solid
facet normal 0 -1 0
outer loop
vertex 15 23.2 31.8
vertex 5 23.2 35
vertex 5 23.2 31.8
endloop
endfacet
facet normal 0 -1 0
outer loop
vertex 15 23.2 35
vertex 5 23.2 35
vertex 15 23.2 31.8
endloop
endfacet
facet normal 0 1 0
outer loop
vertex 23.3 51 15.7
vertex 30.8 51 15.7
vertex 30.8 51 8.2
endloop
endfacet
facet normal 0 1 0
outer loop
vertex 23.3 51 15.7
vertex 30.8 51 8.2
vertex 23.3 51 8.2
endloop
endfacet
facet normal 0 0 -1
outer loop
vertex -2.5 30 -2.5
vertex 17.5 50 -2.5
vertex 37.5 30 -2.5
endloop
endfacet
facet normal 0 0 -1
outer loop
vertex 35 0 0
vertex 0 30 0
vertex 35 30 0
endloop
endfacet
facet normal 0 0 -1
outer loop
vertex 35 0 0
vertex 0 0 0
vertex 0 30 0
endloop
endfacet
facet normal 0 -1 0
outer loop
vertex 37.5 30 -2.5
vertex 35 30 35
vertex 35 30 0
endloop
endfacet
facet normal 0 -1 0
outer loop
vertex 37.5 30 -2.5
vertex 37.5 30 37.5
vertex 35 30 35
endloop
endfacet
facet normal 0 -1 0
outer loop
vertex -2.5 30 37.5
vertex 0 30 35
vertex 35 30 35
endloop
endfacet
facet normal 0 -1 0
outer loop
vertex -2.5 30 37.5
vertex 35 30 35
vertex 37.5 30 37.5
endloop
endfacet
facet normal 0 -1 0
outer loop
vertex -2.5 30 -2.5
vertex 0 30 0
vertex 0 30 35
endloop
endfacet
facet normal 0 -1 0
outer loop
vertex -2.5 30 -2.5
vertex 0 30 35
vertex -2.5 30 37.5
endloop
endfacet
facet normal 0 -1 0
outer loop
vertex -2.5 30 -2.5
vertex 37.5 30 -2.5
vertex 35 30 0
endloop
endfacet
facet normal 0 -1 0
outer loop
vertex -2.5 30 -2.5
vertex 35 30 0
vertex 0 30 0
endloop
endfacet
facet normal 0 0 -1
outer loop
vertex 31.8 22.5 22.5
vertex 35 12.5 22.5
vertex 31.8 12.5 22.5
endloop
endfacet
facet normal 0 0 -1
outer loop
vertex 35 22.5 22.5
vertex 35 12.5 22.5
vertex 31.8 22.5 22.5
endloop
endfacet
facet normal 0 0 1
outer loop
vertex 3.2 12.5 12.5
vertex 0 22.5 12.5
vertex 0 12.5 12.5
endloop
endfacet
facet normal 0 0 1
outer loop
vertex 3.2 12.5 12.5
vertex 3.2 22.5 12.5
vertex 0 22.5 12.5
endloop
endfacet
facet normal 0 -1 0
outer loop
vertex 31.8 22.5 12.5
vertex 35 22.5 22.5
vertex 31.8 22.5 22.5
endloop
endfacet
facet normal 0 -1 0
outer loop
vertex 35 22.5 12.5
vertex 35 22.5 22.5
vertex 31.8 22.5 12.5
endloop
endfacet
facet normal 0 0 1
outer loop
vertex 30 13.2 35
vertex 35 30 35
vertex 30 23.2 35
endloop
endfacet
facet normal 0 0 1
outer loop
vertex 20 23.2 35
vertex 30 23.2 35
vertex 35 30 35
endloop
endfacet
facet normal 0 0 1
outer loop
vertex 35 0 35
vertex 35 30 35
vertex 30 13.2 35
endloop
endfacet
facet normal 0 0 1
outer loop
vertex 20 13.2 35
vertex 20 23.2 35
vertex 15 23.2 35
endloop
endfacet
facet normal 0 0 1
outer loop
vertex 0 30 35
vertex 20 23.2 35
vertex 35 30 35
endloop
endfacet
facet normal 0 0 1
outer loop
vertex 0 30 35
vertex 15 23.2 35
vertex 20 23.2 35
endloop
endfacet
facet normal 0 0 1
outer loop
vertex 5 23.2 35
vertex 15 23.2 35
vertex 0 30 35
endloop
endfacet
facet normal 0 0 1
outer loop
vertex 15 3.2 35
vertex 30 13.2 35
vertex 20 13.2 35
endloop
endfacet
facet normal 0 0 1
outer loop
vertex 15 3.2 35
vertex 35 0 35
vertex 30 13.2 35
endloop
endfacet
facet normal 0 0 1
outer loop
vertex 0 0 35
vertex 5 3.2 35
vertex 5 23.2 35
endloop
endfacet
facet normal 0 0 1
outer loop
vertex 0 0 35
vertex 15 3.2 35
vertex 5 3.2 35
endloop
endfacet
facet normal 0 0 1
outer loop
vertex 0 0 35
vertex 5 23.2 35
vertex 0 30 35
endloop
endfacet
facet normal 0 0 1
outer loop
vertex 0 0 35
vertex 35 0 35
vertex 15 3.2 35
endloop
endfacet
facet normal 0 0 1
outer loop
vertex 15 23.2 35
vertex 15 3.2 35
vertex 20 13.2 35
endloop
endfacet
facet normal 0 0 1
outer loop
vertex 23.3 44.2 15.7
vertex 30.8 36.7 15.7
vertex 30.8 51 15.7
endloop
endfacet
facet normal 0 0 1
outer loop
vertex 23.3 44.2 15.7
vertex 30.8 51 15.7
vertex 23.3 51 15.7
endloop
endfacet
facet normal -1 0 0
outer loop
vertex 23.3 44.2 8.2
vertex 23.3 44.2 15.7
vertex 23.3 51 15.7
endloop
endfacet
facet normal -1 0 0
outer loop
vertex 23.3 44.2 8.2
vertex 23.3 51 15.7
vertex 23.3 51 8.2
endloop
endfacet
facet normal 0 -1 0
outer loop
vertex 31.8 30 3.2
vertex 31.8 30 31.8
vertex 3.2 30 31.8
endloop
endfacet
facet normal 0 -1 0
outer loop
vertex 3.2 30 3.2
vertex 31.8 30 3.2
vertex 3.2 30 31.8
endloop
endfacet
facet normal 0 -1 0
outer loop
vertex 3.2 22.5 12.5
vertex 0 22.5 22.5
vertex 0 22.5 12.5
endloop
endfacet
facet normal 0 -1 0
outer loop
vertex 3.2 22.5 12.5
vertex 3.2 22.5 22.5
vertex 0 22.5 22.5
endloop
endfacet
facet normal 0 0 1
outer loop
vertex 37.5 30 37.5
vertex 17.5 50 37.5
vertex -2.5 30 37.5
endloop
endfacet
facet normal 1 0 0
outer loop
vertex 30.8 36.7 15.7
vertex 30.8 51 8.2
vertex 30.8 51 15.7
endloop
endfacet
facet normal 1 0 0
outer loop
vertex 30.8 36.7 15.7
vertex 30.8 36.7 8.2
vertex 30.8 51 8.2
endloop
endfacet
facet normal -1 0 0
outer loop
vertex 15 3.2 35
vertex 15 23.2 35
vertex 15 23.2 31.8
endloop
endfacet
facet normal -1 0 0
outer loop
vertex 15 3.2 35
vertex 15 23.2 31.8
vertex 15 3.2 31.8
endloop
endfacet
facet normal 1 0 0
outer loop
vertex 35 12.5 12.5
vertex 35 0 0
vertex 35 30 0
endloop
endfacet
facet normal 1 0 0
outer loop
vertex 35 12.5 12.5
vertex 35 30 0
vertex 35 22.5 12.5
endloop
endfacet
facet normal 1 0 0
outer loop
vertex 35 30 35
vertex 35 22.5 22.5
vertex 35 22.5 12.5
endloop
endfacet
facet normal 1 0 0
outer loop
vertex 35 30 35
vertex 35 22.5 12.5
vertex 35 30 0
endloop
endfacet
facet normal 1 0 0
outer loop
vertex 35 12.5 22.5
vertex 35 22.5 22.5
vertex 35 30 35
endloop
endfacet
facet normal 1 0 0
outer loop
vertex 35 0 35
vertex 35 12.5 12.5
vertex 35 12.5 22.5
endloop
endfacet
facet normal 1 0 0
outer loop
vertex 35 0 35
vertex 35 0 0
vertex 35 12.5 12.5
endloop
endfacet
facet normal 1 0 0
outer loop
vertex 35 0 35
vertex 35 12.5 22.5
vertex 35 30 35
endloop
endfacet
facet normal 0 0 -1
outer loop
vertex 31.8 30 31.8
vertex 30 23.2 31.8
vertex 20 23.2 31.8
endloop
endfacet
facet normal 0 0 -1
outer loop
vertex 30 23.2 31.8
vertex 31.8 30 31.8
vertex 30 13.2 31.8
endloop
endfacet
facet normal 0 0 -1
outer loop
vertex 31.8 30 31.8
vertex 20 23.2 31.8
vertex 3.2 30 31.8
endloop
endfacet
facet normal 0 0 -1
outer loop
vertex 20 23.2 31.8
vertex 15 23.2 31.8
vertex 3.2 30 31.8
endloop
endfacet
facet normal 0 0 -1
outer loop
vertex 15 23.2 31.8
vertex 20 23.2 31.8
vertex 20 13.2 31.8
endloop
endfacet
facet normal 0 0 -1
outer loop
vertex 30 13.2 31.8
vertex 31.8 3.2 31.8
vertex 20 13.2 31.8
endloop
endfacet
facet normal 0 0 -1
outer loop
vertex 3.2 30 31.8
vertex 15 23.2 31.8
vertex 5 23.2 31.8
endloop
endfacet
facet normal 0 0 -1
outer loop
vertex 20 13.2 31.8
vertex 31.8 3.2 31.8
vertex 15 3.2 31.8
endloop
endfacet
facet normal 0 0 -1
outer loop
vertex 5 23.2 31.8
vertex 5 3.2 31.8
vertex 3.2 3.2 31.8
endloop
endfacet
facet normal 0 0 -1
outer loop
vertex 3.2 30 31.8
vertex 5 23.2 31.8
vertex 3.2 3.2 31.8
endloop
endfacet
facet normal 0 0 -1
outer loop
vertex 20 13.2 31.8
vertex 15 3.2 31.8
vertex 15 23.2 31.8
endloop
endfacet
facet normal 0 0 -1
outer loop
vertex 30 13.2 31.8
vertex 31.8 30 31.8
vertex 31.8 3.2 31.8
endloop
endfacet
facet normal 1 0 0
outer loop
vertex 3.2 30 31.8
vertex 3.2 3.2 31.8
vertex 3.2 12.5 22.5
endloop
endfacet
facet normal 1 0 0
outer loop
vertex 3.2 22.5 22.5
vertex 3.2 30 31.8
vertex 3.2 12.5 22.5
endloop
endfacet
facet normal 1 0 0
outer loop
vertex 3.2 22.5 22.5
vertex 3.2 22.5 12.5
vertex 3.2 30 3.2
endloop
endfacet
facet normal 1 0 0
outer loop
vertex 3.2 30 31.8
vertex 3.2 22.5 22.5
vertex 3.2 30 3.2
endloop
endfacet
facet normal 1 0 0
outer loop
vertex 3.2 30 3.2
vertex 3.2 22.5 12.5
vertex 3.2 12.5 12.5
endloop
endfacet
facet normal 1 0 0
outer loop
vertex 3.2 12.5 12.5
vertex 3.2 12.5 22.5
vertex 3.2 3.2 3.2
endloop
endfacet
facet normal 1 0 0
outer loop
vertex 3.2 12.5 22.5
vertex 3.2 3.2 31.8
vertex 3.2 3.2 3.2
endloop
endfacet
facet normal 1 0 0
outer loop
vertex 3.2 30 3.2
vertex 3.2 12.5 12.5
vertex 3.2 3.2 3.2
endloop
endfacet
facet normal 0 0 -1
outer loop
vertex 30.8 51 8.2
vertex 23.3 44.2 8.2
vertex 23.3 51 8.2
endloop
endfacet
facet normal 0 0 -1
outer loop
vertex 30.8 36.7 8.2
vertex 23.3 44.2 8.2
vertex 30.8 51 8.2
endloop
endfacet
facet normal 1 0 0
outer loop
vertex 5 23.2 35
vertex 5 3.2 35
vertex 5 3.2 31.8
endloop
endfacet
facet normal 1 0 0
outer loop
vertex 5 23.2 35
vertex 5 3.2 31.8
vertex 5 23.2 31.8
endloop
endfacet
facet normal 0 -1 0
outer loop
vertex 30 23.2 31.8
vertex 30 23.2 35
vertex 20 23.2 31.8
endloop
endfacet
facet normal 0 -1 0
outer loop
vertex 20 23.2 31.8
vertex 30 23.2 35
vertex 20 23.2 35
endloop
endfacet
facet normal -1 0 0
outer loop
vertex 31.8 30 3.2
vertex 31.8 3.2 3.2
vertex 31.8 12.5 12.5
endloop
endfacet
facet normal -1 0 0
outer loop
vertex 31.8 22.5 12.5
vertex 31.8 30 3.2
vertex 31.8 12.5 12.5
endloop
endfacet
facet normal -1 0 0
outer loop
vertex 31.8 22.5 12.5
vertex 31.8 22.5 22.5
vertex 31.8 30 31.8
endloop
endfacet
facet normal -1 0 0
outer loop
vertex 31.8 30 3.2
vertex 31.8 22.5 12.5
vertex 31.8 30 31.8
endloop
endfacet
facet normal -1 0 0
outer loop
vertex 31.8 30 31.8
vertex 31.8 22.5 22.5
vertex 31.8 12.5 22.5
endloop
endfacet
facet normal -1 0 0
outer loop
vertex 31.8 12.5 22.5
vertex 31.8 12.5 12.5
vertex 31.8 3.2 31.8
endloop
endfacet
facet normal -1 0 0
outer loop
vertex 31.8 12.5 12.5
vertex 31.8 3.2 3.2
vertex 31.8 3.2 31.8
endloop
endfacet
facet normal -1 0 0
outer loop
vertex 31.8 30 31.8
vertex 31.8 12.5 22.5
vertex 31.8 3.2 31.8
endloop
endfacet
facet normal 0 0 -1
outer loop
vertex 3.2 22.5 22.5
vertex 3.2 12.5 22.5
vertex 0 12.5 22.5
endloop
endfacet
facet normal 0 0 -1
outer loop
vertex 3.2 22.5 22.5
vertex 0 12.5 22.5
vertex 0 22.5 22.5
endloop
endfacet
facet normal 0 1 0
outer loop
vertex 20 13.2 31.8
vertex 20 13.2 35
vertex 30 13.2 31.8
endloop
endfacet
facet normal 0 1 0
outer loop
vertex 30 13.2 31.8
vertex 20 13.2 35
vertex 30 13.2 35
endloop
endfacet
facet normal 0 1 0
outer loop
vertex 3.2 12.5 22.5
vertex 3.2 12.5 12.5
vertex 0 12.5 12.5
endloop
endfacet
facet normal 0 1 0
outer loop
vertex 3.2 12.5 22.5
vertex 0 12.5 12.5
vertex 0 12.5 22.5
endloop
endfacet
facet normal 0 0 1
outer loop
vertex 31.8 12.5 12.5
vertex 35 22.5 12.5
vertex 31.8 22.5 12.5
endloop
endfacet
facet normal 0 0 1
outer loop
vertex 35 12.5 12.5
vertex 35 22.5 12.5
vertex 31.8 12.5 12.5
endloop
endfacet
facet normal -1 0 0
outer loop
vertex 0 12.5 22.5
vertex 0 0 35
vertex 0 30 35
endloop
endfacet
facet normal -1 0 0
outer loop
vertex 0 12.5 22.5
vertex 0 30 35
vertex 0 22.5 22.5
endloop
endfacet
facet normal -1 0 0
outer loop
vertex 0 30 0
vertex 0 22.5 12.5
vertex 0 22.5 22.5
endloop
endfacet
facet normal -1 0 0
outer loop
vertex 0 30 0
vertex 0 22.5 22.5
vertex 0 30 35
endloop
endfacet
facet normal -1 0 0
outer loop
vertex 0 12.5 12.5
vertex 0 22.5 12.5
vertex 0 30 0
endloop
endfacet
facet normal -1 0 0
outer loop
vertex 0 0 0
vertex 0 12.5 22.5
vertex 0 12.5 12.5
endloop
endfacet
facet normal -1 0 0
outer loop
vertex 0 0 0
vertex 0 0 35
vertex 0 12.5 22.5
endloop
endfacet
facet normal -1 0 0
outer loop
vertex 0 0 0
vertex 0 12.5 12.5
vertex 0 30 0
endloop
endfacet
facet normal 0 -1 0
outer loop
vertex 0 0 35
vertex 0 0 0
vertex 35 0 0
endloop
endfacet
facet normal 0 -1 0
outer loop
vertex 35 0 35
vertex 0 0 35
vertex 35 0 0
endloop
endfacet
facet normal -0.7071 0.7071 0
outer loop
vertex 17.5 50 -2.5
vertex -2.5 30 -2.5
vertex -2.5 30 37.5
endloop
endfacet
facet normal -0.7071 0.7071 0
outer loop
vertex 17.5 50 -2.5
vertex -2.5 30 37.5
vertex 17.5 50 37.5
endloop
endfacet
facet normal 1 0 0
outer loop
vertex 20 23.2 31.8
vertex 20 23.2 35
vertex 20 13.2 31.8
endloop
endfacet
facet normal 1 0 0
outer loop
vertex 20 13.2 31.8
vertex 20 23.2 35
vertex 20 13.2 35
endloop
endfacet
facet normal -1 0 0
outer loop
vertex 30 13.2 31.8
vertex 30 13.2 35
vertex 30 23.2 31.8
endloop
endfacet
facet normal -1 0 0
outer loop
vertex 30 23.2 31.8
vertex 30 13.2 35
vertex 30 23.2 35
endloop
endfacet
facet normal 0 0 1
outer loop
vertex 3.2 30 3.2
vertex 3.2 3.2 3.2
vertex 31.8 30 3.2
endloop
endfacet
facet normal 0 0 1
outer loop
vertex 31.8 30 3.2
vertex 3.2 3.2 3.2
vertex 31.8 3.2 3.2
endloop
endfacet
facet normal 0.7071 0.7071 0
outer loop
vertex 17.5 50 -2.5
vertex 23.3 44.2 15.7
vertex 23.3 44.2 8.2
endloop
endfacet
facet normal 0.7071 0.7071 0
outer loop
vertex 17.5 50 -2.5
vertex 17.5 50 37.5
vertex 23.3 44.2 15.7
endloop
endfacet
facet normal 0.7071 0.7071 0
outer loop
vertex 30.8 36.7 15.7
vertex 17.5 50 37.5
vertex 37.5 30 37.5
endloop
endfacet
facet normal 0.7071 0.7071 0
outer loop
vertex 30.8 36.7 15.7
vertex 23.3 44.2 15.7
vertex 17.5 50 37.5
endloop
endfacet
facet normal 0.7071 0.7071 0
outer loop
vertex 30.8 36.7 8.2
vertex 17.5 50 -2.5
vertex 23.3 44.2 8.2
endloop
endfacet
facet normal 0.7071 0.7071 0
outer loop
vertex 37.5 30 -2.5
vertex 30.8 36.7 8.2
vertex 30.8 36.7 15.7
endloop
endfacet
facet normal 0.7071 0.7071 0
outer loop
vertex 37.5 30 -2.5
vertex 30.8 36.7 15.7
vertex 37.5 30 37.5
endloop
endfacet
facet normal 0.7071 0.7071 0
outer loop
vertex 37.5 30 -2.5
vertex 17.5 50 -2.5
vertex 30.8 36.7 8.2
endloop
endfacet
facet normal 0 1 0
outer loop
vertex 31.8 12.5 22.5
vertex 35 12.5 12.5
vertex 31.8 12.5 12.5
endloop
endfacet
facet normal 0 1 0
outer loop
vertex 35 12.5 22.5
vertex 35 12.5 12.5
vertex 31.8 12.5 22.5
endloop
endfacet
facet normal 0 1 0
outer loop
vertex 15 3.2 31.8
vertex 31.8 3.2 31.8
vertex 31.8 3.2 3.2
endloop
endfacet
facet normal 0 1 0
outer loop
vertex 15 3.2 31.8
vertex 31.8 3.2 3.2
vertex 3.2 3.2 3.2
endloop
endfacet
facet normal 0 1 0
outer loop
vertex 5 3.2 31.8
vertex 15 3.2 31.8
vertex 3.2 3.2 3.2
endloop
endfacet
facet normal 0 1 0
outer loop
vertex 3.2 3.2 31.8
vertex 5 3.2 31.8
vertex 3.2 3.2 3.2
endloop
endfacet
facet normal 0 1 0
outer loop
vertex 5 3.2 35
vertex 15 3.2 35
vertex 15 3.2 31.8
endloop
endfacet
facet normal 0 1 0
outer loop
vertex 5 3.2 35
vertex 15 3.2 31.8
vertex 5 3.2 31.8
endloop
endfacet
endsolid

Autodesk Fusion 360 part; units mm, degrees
sketch "Sketch1" plane through (0, 0, 0) normal (0, 1, 0) x (1, 0, 0)
  line L0 (0, 0) -> (35, 0)
  line L1 (35, 0) -> (35, -35)
  line L2 (35, -35) -> (0, -35)
  line L3 (0, -35) -> (0, 0)
  line L4 (3.2, -3.2) -> (31.8, -3.2)
  line L5 (31.8, -3.2) -> (31.8, -31.8)
  line L6 (31.8, -31.8) -> (3.2, -31.8)
  line L7 (3.2, -31.8) -> (3.2, -3.2)
  dimension "d1" = 35
  dimension "d2" = 35
  dimension "d4" = 3.2
  dimension "d5" = 3.2
  dimension "d6" = 3.2
  dimension "d7" = 3.2
extrude "Extrude1" add sketch "Sketch1" along normal blind 30 makes body 1
sketch "Sketch2" plane through (0, 0, 35) normal (0, 0, 1) x (1, 0, 0)
  line L0 (0, 0) -> (35, 0)
  line L1 (35, 0) -> (35, 30)
  line L2 (35, 30) -> (0, 30)
  line L3 (0, 30) -> (0, 0)
  line L4 (5, 23.2) -> (15, 23.2)
  line L5 (15, 23.2) -> (15, 3.2)
  line L6 (15, 3.2) -> (5, 3.2)
  line L7 (5, 3.2) -> (5, 23.2)
  line L8 (20, 13.2) -> (30, 13.2)
  line L9 (30, 13.2) -> (30, 23.2)
  line L10 (30, 23.2) -> (20, 23.2)
  line L11 (20, 23.2) -> (20, 13.2)
  line L12 (0, 30) -> (-2.5, 30)
  line L13 (35, 30) -> (37.5, 30)
  line L14 (-2.5, 30) -> (17.5, 50)
  line L15 (17.5, 50) -> (37.5, 30)
  dimension "d10" = 3.2
  dimension "d11" = 5
  dimension "d12" = 20
  dimension "d13" = 10
  dimension "d14" = 10
  dimension "d15" = 10
  dimension "d16" = 13.2
  dimension "d17" = 5
  dimension "d39" = 2.5
  dimension "d40" = 2.5
  dimension "d41" = 20
  dimension "d42" = 20
extrude "Extrude2" add sketch "Sketch1" along normal blind 3.2 contours L4 L5 L6 L7 bodies 1
extrude "Extrude3" cut sketch "Sketch2" against normal blind 3.2 contours L4 L5 L6 L7 bodies 1
extrude "Extrude4" cut sketch "Sketch2" against normal blind 3.2 contours L8 L9 L10 L11 bodies 1
sketch "Sketch3" plane through (35, 0, 0) normal (1, 0, 0) x (0, 0, -1)
  line L0 (-35, 0) -> (0, 0)
  line L1 (0, 0) -> (0, 30)
  line L2 (0, 30) -> (-35, 30)
  line L3 (-35, 30) -> (-35, 0)
  line L4 (-22.5, 22.5) -> (-12.5, 22.5)
  line L5 (-12.5, 22.5) -> (-12.5, 12.5)
  line L6 (-12.5, 12.5) -> (-22.5, 12.5)
  line L7 (-22.5, 12.5) -> (-22.5, 22.5)
  line L8 (0, 0) -> (-35, 0)
  dimension "d24" = 10
  dimension "d25" = 10
  dimension "d26" = 12.5
  dimension "d27" = 12.5
extrude "Extrude5" cut sketch "Sketch3" against normal blind 35 contours L4 L5 L6 L7 bodies 1
sketch "Sketch4" plane through (0, 30, 0) normal (0, 1, 0) x (-1, 0, 0)
  line L0 (-31.8, 31.8) -> (-3.2, 31.8)
  line L1 (-3.2, 31.8) -> (-3.2, 3.2)
  line L2 (-3.2, 3.2) -> (-31.8, 3.2)
  line L3 (-31.8, 3.2) -> (-31.8, 31.8)
  line L4 (0, 35) -> (-35, 35)
  line L5 (-35, 35) -> (-35, 0)
  line L6 (-35, 0) -> (0, 0)
  line L7 (0, 0) -> (0, 35)
  line L8 (2.5, -2.5) -> (-37.5, -2.5)
  line L9 (-37.5, -2.5) -> (-37.5, 37.5)
  line L10 (-37.5, 37.5) -> (2.5, 37.5)
  line L11 (2.5, 37.5) -> (2.5, -2.5)
  line L12 (-30.8, 15.7) -> (-23.3, 15.7)
  line L13 (-23.3, 15.7) -> (-23.3, 8.2)
  line L14 (-23.3, 8.2) -> (-30.8, 8.2)
  line L15 (-30.8, 8.2) -> (-30.8, 15.7)
  dimension "d30" = 2.5
  dimension "d31" = 2.5
  dimension "d32" = 2.5
  dimension "d33" = 2.5
  dimension "d34" = 7.5
  dimension "d35" = 7.5
  dimension "d37" = 1
  dimension "d38" = 5
extrude "Extrude6" add sketch "Sketch2" along normal blind 2.5 separate body contours L2 L12 L13 L14 L15 makes body 2
extrude "Extrude7" add sketch "Sketch2" against normal blind 37.5 contours L2 L12 L13 L14 L15 bodies 1 2
extrude "Extrude8" add sketch "Sketch4" along normal blind 21 contours L12 L13 L14 L15 bodies 1
